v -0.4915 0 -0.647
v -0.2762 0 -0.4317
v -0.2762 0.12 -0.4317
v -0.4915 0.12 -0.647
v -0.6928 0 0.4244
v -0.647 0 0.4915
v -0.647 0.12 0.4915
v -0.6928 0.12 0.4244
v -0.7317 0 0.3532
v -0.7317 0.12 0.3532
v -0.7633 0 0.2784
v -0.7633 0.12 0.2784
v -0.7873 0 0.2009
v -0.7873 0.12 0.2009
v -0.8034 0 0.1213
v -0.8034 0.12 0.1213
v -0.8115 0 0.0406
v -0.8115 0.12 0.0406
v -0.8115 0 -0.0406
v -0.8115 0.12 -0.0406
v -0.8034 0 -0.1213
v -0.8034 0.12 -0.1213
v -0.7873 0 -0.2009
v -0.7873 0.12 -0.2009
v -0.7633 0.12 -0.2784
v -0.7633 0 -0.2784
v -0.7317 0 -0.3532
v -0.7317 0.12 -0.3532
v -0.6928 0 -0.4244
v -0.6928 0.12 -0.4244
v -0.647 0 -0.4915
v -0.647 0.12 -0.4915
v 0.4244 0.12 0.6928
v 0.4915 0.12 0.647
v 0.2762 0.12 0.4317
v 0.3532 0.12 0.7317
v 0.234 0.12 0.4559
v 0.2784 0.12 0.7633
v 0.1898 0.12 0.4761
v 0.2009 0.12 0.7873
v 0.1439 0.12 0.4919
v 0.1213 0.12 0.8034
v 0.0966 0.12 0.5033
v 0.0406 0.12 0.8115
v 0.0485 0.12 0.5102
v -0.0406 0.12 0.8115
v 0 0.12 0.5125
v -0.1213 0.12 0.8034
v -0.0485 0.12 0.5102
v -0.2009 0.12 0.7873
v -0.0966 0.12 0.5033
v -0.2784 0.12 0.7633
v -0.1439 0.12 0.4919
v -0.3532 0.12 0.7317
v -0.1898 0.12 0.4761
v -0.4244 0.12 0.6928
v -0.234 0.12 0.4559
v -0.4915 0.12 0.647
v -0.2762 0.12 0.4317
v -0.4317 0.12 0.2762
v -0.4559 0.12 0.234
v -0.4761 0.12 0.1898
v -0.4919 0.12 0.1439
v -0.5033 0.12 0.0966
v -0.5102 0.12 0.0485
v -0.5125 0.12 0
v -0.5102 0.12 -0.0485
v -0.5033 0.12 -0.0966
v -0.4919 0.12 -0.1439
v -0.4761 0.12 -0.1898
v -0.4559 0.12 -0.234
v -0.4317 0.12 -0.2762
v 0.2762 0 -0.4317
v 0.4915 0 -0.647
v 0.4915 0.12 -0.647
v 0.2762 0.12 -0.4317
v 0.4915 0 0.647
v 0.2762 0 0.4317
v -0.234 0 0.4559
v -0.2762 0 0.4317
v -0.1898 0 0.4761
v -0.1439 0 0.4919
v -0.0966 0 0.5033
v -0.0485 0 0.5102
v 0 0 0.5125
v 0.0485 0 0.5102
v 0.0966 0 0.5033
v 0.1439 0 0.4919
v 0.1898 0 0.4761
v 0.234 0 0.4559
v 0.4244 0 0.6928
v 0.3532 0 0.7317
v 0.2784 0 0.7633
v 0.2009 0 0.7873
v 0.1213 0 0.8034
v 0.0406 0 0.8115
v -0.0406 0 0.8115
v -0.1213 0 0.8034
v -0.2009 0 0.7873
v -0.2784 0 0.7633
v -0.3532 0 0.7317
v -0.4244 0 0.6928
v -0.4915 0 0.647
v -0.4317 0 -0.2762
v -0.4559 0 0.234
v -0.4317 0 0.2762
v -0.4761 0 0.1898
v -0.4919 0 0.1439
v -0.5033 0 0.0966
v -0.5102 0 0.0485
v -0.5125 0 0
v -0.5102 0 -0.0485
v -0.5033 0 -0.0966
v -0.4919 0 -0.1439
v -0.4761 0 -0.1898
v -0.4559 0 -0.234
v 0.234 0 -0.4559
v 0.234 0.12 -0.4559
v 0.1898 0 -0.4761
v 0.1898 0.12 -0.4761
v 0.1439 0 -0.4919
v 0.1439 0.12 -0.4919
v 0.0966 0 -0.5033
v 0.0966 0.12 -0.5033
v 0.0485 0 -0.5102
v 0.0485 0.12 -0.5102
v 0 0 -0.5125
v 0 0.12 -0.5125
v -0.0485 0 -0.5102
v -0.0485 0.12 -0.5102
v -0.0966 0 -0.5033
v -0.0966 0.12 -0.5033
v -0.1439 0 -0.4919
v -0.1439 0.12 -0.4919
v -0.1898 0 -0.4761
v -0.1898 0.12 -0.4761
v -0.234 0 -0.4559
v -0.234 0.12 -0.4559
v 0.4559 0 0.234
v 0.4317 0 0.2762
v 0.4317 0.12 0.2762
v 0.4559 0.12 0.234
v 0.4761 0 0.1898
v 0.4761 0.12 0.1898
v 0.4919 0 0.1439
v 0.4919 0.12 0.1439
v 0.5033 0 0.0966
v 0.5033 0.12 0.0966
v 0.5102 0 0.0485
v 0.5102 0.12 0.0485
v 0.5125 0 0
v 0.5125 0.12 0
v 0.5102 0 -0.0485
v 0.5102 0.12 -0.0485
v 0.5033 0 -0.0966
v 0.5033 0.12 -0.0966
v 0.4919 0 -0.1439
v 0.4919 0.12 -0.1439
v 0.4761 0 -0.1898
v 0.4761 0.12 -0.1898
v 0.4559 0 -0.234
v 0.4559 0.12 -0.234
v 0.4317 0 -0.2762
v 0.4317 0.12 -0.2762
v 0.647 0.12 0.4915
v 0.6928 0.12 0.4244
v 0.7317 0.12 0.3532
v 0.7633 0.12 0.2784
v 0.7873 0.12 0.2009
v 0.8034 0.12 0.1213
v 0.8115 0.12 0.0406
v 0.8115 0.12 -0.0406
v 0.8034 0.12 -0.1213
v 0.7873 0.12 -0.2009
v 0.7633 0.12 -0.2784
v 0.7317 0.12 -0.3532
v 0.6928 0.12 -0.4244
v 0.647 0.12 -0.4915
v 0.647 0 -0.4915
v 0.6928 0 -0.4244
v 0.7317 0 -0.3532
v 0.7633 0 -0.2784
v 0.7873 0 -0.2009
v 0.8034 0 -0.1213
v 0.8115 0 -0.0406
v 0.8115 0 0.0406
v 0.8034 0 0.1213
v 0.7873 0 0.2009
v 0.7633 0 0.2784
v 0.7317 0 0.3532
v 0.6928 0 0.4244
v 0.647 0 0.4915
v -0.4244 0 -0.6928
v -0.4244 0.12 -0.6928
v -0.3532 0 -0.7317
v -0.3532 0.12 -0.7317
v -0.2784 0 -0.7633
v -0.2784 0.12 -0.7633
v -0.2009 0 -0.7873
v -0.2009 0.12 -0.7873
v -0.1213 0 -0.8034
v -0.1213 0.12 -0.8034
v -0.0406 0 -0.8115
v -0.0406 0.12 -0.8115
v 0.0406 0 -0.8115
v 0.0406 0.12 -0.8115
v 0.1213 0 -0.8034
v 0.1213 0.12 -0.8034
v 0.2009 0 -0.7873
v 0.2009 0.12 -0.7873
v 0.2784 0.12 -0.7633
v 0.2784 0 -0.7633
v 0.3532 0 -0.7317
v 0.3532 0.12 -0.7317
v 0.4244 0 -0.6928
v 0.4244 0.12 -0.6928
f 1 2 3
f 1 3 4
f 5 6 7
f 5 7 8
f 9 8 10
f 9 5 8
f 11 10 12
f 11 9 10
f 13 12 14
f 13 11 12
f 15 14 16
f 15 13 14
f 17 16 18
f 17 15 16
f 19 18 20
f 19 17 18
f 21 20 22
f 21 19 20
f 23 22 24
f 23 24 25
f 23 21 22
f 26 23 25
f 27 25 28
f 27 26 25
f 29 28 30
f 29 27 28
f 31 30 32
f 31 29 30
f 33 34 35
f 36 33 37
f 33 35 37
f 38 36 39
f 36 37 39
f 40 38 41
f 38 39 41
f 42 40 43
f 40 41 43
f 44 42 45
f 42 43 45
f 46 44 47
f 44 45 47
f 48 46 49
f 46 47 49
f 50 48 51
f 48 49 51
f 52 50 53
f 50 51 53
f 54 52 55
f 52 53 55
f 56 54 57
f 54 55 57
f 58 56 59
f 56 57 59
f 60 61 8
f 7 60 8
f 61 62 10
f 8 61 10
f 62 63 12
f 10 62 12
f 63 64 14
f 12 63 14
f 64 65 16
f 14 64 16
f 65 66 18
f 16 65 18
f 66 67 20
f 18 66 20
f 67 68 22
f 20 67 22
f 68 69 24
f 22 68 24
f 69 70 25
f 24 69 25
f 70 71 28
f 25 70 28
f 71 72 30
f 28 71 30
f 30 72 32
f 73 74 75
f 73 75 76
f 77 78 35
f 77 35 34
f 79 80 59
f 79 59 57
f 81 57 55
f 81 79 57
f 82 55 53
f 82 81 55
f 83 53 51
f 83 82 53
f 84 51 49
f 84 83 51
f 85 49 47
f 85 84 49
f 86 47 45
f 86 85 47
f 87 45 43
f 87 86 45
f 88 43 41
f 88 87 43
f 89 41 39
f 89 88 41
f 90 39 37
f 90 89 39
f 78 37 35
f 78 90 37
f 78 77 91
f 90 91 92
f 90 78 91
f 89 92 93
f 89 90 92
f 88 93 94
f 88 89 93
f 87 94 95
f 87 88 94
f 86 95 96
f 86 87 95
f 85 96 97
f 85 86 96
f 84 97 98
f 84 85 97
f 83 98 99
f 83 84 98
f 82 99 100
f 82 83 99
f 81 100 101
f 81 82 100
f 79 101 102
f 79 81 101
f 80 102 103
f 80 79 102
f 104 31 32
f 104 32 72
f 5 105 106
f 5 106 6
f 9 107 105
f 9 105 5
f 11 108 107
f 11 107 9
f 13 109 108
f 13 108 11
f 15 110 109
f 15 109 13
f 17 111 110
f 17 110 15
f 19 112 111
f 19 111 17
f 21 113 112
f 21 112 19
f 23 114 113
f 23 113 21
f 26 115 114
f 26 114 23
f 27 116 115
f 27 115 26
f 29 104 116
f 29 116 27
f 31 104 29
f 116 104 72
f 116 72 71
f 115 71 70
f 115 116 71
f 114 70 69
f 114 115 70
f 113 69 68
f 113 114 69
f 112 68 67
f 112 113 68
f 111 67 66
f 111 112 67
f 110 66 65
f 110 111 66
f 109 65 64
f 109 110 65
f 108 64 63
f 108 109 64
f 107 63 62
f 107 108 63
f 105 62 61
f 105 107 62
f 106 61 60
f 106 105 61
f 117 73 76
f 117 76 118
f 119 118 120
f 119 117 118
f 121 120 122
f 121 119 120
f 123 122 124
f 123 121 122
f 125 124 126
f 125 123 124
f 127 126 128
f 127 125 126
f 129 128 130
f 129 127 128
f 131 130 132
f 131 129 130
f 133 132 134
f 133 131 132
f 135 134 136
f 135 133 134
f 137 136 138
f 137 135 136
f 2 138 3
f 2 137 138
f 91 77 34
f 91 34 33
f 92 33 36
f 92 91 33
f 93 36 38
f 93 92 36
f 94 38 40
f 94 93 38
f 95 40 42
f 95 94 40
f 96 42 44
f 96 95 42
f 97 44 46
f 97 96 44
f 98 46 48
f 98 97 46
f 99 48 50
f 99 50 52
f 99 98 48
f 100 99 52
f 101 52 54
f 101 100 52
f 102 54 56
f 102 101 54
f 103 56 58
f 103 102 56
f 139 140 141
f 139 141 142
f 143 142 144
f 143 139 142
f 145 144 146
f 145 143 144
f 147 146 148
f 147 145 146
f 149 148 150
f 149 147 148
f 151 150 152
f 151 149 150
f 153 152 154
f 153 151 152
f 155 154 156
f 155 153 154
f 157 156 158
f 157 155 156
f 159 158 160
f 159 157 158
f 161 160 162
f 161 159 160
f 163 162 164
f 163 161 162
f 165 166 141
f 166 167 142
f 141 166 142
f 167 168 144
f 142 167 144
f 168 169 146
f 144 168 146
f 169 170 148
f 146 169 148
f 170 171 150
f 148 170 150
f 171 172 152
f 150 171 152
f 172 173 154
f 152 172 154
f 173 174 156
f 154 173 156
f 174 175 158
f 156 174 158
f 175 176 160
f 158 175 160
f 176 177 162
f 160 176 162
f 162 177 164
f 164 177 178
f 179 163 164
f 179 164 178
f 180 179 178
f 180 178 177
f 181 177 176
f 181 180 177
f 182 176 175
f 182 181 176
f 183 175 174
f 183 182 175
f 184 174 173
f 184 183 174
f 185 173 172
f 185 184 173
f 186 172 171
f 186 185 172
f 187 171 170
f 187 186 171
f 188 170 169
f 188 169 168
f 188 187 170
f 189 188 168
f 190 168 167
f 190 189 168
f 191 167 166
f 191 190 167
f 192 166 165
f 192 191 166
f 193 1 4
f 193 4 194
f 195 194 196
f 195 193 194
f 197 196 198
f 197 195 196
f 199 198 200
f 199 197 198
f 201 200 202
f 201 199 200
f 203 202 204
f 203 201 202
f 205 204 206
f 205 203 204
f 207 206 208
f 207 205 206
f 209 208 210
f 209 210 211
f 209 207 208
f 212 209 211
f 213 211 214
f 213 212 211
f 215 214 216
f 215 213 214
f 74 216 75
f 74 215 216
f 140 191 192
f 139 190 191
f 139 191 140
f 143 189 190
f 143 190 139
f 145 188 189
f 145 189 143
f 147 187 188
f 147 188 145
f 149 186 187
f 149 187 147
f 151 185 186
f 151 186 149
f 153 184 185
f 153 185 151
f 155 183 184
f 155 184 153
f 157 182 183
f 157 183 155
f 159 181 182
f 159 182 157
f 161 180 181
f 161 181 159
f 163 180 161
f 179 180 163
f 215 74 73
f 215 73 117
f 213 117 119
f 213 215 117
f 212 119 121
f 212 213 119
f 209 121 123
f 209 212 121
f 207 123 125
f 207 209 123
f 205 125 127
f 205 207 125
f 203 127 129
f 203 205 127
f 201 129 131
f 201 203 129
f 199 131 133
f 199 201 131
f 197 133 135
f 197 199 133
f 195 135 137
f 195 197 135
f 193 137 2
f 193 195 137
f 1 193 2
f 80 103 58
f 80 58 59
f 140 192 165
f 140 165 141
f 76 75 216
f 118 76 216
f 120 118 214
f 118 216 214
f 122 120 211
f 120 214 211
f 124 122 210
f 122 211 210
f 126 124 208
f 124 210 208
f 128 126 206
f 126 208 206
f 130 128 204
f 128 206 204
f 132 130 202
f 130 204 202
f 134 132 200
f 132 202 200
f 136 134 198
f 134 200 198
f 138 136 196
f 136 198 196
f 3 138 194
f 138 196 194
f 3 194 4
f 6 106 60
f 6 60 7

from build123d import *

# Parameters (mm, degrees)
BOSS_EXTRUDE1_DEPTH   = 0.12
BOSS_EXTRUDE1_2_DEPTH = 0.12
BOSS_EXTRUDE1_3_DEPTH = 0.12
BOSS_EXTRUDE1_4_DEPTH = 0.12


with BuildPart() as part:
    # Sketch1 → Boss-Extrude1 (new body)
    with BuildSketch(Plane(origin=(0, 0, 0), x_dir=(1, 0, 0), z_dir=(0, 1, 0))):
        with BuildLine():
            Line((-0.491452938, -0.64701643), (-0.276164754, -0.431728246))
            ThreePointArc((-0.276164754, -0.431728246), (0, -0.5125), (0.276164754, -0.431728246))
            Line((0.276164754, -0.431728246), (0.491452938, -0.64701643))
            ThreePointArc((0.491452938, -0.64701643), (0, -0.8125), (-0.491452938, -0.64701643))
        make_face()
    extrude(amount=BOSS_EXTRUDE1_DEPTH)


with BuildPart() as body_2:
    # Sketch1 → Boss-Extrude1 2 (new body)
    with BuildSketch(Plane(origin=(0, 0, 0), x_dir=(1, 0, 0), z_dir=(0, 1, 0))):
        with BuildLine():
            Line((0.491452938, 0.64701643), (0.276164754, 0.431728246))
            ThreePointArc((0.276164754, 0.431728246), (0, 0.5125), (-0.276164754, 0.431728246))
            Line((-0.276164754, 0.431728246), (-0.491452938, 0.64701643))
            ThreePointArc((-0.491452938, 0.64701643), (0, 0.8125), (0.491452938, 0.64701643))
        make_face()
    extrude(amount=BOSS_EXTRUDE1_2_DEPTH)


with BuildPart() as body_3:
    # Sketch1 → Boss-Extrude1 3 (new body)
    with BuildSketch(Plane(origin=(0, 0, 0), x_dir=(1, 0, 0), z_dir=(0, 1, 0))):
        with BuildLine():
            Line((-0.64701643, 0.491452938), (-0.431728246, 0.276164754))
            ThreePointArc((-0.431728246, 0.276164754), (-0.5125, 0), (-0.431728246, -0.276164754))
            Line((-0.431728246, -0.276164754), (-0.64701643, -0.491452938))
            ThreePointArc((-0.64701643, -0.491452938), (-0.8125, 0), (-0.64701643, 0.491452938))
        make_face()
    extrude(amount=BOSS_EXTRUDE1_3_DEPTH)


with BuildPart() as body_4:
    # Sketch1 → Boss-Extrude1 4 (new body)
    with BuildSketch(Plane(origin=(0, 0, 0), x_dir=(1, 0, 0), z_dir=(0, 1, 0))):
        with BuildLine():
            Line((0.431728246, 0.276164754), (0.64701643, 0.491452938))
            ThreePointArc((0.64701643, 0.491452938), (0.8125, 0), (0.64701643, -0.491452938))
            Line((0.64701643, -0.491452938), (0.431728246, -0.276164754))
            ThreePointArc((0.431728246, -0.276164754), (0.5125, 0), (0.431728246, 0.276164754))
        make_face()
    extrude(amount=BOSS_EXTRUDE1_4_DEPTH)


solid = Compound([part.part, body_2.part, body_3.part, body_4.part])
